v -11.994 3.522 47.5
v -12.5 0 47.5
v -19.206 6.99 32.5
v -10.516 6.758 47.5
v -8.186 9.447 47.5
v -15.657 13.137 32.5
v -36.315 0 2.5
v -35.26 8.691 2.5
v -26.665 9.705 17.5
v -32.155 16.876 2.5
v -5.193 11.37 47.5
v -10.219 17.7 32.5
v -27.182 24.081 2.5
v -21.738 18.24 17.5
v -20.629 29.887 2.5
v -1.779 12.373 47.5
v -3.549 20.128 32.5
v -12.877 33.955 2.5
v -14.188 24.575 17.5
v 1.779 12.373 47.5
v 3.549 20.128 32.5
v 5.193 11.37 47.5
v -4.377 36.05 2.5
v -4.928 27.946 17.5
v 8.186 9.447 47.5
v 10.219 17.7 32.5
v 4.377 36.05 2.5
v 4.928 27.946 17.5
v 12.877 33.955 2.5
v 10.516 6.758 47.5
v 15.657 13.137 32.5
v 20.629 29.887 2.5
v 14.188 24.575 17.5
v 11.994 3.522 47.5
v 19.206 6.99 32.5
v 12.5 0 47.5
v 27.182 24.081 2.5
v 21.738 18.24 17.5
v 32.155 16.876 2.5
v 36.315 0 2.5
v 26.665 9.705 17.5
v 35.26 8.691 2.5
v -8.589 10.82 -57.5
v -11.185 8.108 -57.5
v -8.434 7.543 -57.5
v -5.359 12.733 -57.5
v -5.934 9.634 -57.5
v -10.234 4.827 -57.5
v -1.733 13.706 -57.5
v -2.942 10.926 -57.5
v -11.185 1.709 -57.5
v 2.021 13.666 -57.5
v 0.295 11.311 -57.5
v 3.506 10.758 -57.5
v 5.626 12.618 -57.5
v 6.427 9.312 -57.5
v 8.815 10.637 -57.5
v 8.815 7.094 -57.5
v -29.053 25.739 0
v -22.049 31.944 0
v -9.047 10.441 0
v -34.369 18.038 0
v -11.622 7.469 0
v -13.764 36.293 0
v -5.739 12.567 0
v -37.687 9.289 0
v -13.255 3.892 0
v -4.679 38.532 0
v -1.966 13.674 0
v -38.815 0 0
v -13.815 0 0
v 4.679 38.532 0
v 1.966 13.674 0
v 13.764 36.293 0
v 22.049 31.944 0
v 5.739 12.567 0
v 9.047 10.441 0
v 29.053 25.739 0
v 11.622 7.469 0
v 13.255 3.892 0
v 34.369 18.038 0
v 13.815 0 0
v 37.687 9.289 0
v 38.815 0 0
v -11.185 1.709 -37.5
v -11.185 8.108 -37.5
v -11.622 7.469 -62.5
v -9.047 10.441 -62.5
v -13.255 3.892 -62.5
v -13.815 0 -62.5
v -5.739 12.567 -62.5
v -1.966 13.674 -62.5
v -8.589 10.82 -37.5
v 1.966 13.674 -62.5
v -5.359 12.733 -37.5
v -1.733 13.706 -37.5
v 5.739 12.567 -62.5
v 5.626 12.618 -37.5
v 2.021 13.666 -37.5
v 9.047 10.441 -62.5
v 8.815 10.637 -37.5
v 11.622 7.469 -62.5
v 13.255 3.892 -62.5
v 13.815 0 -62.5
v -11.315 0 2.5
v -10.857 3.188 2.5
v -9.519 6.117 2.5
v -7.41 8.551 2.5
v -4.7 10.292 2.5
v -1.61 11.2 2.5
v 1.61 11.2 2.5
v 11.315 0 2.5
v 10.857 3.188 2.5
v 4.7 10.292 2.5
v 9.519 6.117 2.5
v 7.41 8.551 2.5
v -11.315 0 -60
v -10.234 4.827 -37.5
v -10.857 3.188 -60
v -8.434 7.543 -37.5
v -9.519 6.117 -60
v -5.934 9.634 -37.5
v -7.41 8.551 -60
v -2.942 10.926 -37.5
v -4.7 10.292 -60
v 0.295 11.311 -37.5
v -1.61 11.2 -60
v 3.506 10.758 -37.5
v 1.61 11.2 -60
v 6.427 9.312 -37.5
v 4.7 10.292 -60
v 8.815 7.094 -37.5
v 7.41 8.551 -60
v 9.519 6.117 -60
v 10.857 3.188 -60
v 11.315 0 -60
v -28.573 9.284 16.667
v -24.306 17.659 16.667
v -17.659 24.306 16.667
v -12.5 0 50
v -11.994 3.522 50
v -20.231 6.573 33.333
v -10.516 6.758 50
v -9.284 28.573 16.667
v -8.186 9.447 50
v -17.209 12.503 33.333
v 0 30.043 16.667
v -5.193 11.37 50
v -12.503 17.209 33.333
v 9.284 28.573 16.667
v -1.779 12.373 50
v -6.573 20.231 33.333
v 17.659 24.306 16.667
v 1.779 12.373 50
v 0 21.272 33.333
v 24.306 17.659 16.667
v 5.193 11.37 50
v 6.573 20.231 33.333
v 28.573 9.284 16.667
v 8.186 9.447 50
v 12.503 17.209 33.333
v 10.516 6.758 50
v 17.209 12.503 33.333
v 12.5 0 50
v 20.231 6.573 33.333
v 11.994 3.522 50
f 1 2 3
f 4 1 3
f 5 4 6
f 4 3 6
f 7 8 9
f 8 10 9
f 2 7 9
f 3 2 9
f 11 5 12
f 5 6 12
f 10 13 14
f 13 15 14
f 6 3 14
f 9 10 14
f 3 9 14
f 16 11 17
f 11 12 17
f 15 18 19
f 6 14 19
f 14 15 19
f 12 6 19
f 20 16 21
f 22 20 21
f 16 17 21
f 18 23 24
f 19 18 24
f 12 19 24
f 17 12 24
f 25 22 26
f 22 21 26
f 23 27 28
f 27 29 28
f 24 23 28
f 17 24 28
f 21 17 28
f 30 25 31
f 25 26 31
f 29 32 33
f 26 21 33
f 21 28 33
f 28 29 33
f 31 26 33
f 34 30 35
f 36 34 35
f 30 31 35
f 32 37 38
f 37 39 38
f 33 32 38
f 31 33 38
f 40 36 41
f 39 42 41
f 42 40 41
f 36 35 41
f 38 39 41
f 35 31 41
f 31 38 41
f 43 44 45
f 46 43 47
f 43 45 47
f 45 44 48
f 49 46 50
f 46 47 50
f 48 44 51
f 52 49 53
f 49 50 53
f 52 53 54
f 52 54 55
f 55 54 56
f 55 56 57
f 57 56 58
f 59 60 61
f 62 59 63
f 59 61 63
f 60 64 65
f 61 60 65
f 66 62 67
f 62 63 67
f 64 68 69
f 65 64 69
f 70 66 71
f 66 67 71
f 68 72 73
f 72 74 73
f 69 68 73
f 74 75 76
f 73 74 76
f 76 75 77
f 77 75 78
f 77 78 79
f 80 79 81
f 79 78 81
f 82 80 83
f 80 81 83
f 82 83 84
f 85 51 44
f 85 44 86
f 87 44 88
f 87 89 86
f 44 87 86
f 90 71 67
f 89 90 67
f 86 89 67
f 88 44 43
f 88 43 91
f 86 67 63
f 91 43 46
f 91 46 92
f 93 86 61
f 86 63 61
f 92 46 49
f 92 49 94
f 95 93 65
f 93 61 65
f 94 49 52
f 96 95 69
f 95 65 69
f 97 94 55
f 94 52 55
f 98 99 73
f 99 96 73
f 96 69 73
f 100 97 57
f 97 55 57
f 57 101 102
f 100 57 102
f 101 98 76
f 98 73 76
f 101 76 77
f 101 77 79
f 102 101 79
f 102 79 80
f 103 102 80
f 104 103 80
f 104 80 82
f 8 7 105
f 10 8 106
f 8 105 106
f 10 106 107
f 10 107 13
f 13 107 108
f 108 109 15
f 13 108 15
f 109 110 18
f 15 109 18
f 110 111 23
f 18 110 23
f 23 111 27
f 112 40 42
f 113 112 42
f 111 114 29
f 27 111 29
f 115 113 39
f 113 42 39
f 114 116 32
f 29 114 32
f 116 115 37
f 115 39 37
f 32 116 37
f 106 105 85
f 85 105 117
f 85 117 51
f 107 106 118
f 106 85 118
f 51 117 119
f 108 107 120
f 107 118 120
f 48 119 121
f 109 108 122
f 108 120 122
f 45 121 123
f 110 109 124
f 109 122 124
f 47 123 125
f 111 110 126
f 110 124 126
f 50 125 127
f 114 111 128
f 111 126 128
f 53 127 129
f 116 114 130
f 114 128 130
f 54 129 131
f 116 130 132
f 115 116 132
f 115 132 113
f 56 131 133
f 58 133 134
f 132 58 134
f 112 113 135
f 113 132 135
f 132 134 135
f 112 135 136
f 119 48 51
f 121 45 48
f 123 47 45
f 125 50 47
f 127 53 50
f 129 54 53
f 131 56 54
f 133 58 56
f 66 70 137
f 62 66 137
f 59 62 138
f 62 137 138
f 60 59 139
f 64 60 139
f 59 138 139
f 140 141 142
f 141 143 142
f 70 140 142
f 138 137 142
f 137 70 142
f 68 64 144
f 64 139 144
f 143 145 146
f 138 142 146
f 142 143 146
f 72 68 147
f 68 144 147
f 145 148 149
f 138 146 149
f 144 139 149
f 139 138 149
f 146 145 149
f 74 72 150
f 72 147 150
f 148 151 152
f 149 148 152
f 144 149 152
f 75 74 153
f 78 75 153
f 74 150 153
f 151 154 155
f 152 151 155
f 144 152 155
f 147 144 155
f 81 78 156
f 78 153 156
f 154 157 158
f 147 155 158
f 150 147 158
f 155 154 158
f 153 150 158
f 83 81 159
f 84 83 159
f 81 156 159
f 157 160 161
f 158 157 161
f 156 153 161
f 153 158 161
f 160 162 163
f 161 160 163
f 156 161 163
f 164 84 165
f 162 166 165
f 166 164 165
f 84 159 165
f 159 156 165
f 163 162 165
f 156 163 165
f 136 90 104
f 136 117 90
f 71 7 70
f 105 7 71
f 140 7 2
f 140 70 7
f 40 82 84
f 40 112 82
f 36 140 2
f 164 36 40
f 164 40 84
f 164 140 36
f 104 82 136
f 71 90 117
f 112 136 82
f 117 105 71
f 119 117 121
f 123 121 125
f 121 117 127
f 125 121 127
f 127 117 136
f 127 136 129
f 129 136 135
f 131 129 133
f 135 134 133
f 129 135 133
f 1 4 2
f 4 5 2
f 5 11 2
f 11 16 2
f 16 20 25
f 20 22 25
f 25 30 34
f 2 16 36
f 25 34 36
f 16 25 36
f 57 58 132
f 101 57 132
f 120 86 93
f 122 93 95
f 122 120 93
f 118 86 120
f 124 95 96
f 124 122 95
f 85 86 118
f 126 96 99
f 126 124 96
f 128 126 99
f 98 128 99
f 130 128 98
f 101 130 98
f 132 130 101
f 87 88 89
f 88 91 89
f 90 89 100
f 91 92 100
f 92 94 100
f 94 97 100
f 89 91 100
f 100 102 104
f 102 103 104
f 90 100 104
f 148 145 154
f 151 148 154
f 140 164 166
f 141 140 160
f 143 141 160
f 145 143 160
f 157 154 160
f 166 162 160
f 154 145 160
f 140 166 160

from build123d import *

# Parameters (mm, degrees)
F1_ANGLE = 180
F2_W     = 20
F2_H     = 20
F3_DEPTH = 25


with BuildPart() as f1:
    # F0 (on Right) → F1 (revolve, symmetric)
    with BuildSketch(Plane.YZ) as f1_sk:
        Polygon((0, -60), (0, -62.5), (13.814939, -62.5), (13.814939, 0), (38.814939, 0), (12.5, 50), (0, 50), (0, 47.5), (12.5, 47.5), (36.314939, 2.5), (11.314939, 2.5), (11.314939, -60), align=None)
    revolve(axis=Axis((0, 0, -61.25), (0, 0, 1)), revolution_arc=F1_ANGLE / 2)
    revolve(f1_sk.sketch, axis=Axis((0, 0, -61.25), (0, 0, -1)), revolution_arc=F1_ANGLE / 2)

    # F2 (on Front) → F3 (cut)
    with BuildSketch(Plane.XZ):
        with Locations((-1.185061, -47.5)):
            Rectangle(F2_W, F2_H)
    extrude(amount=-F3_DEPTH, mode=Mode.SUBTRACT)


solid = f1.part
